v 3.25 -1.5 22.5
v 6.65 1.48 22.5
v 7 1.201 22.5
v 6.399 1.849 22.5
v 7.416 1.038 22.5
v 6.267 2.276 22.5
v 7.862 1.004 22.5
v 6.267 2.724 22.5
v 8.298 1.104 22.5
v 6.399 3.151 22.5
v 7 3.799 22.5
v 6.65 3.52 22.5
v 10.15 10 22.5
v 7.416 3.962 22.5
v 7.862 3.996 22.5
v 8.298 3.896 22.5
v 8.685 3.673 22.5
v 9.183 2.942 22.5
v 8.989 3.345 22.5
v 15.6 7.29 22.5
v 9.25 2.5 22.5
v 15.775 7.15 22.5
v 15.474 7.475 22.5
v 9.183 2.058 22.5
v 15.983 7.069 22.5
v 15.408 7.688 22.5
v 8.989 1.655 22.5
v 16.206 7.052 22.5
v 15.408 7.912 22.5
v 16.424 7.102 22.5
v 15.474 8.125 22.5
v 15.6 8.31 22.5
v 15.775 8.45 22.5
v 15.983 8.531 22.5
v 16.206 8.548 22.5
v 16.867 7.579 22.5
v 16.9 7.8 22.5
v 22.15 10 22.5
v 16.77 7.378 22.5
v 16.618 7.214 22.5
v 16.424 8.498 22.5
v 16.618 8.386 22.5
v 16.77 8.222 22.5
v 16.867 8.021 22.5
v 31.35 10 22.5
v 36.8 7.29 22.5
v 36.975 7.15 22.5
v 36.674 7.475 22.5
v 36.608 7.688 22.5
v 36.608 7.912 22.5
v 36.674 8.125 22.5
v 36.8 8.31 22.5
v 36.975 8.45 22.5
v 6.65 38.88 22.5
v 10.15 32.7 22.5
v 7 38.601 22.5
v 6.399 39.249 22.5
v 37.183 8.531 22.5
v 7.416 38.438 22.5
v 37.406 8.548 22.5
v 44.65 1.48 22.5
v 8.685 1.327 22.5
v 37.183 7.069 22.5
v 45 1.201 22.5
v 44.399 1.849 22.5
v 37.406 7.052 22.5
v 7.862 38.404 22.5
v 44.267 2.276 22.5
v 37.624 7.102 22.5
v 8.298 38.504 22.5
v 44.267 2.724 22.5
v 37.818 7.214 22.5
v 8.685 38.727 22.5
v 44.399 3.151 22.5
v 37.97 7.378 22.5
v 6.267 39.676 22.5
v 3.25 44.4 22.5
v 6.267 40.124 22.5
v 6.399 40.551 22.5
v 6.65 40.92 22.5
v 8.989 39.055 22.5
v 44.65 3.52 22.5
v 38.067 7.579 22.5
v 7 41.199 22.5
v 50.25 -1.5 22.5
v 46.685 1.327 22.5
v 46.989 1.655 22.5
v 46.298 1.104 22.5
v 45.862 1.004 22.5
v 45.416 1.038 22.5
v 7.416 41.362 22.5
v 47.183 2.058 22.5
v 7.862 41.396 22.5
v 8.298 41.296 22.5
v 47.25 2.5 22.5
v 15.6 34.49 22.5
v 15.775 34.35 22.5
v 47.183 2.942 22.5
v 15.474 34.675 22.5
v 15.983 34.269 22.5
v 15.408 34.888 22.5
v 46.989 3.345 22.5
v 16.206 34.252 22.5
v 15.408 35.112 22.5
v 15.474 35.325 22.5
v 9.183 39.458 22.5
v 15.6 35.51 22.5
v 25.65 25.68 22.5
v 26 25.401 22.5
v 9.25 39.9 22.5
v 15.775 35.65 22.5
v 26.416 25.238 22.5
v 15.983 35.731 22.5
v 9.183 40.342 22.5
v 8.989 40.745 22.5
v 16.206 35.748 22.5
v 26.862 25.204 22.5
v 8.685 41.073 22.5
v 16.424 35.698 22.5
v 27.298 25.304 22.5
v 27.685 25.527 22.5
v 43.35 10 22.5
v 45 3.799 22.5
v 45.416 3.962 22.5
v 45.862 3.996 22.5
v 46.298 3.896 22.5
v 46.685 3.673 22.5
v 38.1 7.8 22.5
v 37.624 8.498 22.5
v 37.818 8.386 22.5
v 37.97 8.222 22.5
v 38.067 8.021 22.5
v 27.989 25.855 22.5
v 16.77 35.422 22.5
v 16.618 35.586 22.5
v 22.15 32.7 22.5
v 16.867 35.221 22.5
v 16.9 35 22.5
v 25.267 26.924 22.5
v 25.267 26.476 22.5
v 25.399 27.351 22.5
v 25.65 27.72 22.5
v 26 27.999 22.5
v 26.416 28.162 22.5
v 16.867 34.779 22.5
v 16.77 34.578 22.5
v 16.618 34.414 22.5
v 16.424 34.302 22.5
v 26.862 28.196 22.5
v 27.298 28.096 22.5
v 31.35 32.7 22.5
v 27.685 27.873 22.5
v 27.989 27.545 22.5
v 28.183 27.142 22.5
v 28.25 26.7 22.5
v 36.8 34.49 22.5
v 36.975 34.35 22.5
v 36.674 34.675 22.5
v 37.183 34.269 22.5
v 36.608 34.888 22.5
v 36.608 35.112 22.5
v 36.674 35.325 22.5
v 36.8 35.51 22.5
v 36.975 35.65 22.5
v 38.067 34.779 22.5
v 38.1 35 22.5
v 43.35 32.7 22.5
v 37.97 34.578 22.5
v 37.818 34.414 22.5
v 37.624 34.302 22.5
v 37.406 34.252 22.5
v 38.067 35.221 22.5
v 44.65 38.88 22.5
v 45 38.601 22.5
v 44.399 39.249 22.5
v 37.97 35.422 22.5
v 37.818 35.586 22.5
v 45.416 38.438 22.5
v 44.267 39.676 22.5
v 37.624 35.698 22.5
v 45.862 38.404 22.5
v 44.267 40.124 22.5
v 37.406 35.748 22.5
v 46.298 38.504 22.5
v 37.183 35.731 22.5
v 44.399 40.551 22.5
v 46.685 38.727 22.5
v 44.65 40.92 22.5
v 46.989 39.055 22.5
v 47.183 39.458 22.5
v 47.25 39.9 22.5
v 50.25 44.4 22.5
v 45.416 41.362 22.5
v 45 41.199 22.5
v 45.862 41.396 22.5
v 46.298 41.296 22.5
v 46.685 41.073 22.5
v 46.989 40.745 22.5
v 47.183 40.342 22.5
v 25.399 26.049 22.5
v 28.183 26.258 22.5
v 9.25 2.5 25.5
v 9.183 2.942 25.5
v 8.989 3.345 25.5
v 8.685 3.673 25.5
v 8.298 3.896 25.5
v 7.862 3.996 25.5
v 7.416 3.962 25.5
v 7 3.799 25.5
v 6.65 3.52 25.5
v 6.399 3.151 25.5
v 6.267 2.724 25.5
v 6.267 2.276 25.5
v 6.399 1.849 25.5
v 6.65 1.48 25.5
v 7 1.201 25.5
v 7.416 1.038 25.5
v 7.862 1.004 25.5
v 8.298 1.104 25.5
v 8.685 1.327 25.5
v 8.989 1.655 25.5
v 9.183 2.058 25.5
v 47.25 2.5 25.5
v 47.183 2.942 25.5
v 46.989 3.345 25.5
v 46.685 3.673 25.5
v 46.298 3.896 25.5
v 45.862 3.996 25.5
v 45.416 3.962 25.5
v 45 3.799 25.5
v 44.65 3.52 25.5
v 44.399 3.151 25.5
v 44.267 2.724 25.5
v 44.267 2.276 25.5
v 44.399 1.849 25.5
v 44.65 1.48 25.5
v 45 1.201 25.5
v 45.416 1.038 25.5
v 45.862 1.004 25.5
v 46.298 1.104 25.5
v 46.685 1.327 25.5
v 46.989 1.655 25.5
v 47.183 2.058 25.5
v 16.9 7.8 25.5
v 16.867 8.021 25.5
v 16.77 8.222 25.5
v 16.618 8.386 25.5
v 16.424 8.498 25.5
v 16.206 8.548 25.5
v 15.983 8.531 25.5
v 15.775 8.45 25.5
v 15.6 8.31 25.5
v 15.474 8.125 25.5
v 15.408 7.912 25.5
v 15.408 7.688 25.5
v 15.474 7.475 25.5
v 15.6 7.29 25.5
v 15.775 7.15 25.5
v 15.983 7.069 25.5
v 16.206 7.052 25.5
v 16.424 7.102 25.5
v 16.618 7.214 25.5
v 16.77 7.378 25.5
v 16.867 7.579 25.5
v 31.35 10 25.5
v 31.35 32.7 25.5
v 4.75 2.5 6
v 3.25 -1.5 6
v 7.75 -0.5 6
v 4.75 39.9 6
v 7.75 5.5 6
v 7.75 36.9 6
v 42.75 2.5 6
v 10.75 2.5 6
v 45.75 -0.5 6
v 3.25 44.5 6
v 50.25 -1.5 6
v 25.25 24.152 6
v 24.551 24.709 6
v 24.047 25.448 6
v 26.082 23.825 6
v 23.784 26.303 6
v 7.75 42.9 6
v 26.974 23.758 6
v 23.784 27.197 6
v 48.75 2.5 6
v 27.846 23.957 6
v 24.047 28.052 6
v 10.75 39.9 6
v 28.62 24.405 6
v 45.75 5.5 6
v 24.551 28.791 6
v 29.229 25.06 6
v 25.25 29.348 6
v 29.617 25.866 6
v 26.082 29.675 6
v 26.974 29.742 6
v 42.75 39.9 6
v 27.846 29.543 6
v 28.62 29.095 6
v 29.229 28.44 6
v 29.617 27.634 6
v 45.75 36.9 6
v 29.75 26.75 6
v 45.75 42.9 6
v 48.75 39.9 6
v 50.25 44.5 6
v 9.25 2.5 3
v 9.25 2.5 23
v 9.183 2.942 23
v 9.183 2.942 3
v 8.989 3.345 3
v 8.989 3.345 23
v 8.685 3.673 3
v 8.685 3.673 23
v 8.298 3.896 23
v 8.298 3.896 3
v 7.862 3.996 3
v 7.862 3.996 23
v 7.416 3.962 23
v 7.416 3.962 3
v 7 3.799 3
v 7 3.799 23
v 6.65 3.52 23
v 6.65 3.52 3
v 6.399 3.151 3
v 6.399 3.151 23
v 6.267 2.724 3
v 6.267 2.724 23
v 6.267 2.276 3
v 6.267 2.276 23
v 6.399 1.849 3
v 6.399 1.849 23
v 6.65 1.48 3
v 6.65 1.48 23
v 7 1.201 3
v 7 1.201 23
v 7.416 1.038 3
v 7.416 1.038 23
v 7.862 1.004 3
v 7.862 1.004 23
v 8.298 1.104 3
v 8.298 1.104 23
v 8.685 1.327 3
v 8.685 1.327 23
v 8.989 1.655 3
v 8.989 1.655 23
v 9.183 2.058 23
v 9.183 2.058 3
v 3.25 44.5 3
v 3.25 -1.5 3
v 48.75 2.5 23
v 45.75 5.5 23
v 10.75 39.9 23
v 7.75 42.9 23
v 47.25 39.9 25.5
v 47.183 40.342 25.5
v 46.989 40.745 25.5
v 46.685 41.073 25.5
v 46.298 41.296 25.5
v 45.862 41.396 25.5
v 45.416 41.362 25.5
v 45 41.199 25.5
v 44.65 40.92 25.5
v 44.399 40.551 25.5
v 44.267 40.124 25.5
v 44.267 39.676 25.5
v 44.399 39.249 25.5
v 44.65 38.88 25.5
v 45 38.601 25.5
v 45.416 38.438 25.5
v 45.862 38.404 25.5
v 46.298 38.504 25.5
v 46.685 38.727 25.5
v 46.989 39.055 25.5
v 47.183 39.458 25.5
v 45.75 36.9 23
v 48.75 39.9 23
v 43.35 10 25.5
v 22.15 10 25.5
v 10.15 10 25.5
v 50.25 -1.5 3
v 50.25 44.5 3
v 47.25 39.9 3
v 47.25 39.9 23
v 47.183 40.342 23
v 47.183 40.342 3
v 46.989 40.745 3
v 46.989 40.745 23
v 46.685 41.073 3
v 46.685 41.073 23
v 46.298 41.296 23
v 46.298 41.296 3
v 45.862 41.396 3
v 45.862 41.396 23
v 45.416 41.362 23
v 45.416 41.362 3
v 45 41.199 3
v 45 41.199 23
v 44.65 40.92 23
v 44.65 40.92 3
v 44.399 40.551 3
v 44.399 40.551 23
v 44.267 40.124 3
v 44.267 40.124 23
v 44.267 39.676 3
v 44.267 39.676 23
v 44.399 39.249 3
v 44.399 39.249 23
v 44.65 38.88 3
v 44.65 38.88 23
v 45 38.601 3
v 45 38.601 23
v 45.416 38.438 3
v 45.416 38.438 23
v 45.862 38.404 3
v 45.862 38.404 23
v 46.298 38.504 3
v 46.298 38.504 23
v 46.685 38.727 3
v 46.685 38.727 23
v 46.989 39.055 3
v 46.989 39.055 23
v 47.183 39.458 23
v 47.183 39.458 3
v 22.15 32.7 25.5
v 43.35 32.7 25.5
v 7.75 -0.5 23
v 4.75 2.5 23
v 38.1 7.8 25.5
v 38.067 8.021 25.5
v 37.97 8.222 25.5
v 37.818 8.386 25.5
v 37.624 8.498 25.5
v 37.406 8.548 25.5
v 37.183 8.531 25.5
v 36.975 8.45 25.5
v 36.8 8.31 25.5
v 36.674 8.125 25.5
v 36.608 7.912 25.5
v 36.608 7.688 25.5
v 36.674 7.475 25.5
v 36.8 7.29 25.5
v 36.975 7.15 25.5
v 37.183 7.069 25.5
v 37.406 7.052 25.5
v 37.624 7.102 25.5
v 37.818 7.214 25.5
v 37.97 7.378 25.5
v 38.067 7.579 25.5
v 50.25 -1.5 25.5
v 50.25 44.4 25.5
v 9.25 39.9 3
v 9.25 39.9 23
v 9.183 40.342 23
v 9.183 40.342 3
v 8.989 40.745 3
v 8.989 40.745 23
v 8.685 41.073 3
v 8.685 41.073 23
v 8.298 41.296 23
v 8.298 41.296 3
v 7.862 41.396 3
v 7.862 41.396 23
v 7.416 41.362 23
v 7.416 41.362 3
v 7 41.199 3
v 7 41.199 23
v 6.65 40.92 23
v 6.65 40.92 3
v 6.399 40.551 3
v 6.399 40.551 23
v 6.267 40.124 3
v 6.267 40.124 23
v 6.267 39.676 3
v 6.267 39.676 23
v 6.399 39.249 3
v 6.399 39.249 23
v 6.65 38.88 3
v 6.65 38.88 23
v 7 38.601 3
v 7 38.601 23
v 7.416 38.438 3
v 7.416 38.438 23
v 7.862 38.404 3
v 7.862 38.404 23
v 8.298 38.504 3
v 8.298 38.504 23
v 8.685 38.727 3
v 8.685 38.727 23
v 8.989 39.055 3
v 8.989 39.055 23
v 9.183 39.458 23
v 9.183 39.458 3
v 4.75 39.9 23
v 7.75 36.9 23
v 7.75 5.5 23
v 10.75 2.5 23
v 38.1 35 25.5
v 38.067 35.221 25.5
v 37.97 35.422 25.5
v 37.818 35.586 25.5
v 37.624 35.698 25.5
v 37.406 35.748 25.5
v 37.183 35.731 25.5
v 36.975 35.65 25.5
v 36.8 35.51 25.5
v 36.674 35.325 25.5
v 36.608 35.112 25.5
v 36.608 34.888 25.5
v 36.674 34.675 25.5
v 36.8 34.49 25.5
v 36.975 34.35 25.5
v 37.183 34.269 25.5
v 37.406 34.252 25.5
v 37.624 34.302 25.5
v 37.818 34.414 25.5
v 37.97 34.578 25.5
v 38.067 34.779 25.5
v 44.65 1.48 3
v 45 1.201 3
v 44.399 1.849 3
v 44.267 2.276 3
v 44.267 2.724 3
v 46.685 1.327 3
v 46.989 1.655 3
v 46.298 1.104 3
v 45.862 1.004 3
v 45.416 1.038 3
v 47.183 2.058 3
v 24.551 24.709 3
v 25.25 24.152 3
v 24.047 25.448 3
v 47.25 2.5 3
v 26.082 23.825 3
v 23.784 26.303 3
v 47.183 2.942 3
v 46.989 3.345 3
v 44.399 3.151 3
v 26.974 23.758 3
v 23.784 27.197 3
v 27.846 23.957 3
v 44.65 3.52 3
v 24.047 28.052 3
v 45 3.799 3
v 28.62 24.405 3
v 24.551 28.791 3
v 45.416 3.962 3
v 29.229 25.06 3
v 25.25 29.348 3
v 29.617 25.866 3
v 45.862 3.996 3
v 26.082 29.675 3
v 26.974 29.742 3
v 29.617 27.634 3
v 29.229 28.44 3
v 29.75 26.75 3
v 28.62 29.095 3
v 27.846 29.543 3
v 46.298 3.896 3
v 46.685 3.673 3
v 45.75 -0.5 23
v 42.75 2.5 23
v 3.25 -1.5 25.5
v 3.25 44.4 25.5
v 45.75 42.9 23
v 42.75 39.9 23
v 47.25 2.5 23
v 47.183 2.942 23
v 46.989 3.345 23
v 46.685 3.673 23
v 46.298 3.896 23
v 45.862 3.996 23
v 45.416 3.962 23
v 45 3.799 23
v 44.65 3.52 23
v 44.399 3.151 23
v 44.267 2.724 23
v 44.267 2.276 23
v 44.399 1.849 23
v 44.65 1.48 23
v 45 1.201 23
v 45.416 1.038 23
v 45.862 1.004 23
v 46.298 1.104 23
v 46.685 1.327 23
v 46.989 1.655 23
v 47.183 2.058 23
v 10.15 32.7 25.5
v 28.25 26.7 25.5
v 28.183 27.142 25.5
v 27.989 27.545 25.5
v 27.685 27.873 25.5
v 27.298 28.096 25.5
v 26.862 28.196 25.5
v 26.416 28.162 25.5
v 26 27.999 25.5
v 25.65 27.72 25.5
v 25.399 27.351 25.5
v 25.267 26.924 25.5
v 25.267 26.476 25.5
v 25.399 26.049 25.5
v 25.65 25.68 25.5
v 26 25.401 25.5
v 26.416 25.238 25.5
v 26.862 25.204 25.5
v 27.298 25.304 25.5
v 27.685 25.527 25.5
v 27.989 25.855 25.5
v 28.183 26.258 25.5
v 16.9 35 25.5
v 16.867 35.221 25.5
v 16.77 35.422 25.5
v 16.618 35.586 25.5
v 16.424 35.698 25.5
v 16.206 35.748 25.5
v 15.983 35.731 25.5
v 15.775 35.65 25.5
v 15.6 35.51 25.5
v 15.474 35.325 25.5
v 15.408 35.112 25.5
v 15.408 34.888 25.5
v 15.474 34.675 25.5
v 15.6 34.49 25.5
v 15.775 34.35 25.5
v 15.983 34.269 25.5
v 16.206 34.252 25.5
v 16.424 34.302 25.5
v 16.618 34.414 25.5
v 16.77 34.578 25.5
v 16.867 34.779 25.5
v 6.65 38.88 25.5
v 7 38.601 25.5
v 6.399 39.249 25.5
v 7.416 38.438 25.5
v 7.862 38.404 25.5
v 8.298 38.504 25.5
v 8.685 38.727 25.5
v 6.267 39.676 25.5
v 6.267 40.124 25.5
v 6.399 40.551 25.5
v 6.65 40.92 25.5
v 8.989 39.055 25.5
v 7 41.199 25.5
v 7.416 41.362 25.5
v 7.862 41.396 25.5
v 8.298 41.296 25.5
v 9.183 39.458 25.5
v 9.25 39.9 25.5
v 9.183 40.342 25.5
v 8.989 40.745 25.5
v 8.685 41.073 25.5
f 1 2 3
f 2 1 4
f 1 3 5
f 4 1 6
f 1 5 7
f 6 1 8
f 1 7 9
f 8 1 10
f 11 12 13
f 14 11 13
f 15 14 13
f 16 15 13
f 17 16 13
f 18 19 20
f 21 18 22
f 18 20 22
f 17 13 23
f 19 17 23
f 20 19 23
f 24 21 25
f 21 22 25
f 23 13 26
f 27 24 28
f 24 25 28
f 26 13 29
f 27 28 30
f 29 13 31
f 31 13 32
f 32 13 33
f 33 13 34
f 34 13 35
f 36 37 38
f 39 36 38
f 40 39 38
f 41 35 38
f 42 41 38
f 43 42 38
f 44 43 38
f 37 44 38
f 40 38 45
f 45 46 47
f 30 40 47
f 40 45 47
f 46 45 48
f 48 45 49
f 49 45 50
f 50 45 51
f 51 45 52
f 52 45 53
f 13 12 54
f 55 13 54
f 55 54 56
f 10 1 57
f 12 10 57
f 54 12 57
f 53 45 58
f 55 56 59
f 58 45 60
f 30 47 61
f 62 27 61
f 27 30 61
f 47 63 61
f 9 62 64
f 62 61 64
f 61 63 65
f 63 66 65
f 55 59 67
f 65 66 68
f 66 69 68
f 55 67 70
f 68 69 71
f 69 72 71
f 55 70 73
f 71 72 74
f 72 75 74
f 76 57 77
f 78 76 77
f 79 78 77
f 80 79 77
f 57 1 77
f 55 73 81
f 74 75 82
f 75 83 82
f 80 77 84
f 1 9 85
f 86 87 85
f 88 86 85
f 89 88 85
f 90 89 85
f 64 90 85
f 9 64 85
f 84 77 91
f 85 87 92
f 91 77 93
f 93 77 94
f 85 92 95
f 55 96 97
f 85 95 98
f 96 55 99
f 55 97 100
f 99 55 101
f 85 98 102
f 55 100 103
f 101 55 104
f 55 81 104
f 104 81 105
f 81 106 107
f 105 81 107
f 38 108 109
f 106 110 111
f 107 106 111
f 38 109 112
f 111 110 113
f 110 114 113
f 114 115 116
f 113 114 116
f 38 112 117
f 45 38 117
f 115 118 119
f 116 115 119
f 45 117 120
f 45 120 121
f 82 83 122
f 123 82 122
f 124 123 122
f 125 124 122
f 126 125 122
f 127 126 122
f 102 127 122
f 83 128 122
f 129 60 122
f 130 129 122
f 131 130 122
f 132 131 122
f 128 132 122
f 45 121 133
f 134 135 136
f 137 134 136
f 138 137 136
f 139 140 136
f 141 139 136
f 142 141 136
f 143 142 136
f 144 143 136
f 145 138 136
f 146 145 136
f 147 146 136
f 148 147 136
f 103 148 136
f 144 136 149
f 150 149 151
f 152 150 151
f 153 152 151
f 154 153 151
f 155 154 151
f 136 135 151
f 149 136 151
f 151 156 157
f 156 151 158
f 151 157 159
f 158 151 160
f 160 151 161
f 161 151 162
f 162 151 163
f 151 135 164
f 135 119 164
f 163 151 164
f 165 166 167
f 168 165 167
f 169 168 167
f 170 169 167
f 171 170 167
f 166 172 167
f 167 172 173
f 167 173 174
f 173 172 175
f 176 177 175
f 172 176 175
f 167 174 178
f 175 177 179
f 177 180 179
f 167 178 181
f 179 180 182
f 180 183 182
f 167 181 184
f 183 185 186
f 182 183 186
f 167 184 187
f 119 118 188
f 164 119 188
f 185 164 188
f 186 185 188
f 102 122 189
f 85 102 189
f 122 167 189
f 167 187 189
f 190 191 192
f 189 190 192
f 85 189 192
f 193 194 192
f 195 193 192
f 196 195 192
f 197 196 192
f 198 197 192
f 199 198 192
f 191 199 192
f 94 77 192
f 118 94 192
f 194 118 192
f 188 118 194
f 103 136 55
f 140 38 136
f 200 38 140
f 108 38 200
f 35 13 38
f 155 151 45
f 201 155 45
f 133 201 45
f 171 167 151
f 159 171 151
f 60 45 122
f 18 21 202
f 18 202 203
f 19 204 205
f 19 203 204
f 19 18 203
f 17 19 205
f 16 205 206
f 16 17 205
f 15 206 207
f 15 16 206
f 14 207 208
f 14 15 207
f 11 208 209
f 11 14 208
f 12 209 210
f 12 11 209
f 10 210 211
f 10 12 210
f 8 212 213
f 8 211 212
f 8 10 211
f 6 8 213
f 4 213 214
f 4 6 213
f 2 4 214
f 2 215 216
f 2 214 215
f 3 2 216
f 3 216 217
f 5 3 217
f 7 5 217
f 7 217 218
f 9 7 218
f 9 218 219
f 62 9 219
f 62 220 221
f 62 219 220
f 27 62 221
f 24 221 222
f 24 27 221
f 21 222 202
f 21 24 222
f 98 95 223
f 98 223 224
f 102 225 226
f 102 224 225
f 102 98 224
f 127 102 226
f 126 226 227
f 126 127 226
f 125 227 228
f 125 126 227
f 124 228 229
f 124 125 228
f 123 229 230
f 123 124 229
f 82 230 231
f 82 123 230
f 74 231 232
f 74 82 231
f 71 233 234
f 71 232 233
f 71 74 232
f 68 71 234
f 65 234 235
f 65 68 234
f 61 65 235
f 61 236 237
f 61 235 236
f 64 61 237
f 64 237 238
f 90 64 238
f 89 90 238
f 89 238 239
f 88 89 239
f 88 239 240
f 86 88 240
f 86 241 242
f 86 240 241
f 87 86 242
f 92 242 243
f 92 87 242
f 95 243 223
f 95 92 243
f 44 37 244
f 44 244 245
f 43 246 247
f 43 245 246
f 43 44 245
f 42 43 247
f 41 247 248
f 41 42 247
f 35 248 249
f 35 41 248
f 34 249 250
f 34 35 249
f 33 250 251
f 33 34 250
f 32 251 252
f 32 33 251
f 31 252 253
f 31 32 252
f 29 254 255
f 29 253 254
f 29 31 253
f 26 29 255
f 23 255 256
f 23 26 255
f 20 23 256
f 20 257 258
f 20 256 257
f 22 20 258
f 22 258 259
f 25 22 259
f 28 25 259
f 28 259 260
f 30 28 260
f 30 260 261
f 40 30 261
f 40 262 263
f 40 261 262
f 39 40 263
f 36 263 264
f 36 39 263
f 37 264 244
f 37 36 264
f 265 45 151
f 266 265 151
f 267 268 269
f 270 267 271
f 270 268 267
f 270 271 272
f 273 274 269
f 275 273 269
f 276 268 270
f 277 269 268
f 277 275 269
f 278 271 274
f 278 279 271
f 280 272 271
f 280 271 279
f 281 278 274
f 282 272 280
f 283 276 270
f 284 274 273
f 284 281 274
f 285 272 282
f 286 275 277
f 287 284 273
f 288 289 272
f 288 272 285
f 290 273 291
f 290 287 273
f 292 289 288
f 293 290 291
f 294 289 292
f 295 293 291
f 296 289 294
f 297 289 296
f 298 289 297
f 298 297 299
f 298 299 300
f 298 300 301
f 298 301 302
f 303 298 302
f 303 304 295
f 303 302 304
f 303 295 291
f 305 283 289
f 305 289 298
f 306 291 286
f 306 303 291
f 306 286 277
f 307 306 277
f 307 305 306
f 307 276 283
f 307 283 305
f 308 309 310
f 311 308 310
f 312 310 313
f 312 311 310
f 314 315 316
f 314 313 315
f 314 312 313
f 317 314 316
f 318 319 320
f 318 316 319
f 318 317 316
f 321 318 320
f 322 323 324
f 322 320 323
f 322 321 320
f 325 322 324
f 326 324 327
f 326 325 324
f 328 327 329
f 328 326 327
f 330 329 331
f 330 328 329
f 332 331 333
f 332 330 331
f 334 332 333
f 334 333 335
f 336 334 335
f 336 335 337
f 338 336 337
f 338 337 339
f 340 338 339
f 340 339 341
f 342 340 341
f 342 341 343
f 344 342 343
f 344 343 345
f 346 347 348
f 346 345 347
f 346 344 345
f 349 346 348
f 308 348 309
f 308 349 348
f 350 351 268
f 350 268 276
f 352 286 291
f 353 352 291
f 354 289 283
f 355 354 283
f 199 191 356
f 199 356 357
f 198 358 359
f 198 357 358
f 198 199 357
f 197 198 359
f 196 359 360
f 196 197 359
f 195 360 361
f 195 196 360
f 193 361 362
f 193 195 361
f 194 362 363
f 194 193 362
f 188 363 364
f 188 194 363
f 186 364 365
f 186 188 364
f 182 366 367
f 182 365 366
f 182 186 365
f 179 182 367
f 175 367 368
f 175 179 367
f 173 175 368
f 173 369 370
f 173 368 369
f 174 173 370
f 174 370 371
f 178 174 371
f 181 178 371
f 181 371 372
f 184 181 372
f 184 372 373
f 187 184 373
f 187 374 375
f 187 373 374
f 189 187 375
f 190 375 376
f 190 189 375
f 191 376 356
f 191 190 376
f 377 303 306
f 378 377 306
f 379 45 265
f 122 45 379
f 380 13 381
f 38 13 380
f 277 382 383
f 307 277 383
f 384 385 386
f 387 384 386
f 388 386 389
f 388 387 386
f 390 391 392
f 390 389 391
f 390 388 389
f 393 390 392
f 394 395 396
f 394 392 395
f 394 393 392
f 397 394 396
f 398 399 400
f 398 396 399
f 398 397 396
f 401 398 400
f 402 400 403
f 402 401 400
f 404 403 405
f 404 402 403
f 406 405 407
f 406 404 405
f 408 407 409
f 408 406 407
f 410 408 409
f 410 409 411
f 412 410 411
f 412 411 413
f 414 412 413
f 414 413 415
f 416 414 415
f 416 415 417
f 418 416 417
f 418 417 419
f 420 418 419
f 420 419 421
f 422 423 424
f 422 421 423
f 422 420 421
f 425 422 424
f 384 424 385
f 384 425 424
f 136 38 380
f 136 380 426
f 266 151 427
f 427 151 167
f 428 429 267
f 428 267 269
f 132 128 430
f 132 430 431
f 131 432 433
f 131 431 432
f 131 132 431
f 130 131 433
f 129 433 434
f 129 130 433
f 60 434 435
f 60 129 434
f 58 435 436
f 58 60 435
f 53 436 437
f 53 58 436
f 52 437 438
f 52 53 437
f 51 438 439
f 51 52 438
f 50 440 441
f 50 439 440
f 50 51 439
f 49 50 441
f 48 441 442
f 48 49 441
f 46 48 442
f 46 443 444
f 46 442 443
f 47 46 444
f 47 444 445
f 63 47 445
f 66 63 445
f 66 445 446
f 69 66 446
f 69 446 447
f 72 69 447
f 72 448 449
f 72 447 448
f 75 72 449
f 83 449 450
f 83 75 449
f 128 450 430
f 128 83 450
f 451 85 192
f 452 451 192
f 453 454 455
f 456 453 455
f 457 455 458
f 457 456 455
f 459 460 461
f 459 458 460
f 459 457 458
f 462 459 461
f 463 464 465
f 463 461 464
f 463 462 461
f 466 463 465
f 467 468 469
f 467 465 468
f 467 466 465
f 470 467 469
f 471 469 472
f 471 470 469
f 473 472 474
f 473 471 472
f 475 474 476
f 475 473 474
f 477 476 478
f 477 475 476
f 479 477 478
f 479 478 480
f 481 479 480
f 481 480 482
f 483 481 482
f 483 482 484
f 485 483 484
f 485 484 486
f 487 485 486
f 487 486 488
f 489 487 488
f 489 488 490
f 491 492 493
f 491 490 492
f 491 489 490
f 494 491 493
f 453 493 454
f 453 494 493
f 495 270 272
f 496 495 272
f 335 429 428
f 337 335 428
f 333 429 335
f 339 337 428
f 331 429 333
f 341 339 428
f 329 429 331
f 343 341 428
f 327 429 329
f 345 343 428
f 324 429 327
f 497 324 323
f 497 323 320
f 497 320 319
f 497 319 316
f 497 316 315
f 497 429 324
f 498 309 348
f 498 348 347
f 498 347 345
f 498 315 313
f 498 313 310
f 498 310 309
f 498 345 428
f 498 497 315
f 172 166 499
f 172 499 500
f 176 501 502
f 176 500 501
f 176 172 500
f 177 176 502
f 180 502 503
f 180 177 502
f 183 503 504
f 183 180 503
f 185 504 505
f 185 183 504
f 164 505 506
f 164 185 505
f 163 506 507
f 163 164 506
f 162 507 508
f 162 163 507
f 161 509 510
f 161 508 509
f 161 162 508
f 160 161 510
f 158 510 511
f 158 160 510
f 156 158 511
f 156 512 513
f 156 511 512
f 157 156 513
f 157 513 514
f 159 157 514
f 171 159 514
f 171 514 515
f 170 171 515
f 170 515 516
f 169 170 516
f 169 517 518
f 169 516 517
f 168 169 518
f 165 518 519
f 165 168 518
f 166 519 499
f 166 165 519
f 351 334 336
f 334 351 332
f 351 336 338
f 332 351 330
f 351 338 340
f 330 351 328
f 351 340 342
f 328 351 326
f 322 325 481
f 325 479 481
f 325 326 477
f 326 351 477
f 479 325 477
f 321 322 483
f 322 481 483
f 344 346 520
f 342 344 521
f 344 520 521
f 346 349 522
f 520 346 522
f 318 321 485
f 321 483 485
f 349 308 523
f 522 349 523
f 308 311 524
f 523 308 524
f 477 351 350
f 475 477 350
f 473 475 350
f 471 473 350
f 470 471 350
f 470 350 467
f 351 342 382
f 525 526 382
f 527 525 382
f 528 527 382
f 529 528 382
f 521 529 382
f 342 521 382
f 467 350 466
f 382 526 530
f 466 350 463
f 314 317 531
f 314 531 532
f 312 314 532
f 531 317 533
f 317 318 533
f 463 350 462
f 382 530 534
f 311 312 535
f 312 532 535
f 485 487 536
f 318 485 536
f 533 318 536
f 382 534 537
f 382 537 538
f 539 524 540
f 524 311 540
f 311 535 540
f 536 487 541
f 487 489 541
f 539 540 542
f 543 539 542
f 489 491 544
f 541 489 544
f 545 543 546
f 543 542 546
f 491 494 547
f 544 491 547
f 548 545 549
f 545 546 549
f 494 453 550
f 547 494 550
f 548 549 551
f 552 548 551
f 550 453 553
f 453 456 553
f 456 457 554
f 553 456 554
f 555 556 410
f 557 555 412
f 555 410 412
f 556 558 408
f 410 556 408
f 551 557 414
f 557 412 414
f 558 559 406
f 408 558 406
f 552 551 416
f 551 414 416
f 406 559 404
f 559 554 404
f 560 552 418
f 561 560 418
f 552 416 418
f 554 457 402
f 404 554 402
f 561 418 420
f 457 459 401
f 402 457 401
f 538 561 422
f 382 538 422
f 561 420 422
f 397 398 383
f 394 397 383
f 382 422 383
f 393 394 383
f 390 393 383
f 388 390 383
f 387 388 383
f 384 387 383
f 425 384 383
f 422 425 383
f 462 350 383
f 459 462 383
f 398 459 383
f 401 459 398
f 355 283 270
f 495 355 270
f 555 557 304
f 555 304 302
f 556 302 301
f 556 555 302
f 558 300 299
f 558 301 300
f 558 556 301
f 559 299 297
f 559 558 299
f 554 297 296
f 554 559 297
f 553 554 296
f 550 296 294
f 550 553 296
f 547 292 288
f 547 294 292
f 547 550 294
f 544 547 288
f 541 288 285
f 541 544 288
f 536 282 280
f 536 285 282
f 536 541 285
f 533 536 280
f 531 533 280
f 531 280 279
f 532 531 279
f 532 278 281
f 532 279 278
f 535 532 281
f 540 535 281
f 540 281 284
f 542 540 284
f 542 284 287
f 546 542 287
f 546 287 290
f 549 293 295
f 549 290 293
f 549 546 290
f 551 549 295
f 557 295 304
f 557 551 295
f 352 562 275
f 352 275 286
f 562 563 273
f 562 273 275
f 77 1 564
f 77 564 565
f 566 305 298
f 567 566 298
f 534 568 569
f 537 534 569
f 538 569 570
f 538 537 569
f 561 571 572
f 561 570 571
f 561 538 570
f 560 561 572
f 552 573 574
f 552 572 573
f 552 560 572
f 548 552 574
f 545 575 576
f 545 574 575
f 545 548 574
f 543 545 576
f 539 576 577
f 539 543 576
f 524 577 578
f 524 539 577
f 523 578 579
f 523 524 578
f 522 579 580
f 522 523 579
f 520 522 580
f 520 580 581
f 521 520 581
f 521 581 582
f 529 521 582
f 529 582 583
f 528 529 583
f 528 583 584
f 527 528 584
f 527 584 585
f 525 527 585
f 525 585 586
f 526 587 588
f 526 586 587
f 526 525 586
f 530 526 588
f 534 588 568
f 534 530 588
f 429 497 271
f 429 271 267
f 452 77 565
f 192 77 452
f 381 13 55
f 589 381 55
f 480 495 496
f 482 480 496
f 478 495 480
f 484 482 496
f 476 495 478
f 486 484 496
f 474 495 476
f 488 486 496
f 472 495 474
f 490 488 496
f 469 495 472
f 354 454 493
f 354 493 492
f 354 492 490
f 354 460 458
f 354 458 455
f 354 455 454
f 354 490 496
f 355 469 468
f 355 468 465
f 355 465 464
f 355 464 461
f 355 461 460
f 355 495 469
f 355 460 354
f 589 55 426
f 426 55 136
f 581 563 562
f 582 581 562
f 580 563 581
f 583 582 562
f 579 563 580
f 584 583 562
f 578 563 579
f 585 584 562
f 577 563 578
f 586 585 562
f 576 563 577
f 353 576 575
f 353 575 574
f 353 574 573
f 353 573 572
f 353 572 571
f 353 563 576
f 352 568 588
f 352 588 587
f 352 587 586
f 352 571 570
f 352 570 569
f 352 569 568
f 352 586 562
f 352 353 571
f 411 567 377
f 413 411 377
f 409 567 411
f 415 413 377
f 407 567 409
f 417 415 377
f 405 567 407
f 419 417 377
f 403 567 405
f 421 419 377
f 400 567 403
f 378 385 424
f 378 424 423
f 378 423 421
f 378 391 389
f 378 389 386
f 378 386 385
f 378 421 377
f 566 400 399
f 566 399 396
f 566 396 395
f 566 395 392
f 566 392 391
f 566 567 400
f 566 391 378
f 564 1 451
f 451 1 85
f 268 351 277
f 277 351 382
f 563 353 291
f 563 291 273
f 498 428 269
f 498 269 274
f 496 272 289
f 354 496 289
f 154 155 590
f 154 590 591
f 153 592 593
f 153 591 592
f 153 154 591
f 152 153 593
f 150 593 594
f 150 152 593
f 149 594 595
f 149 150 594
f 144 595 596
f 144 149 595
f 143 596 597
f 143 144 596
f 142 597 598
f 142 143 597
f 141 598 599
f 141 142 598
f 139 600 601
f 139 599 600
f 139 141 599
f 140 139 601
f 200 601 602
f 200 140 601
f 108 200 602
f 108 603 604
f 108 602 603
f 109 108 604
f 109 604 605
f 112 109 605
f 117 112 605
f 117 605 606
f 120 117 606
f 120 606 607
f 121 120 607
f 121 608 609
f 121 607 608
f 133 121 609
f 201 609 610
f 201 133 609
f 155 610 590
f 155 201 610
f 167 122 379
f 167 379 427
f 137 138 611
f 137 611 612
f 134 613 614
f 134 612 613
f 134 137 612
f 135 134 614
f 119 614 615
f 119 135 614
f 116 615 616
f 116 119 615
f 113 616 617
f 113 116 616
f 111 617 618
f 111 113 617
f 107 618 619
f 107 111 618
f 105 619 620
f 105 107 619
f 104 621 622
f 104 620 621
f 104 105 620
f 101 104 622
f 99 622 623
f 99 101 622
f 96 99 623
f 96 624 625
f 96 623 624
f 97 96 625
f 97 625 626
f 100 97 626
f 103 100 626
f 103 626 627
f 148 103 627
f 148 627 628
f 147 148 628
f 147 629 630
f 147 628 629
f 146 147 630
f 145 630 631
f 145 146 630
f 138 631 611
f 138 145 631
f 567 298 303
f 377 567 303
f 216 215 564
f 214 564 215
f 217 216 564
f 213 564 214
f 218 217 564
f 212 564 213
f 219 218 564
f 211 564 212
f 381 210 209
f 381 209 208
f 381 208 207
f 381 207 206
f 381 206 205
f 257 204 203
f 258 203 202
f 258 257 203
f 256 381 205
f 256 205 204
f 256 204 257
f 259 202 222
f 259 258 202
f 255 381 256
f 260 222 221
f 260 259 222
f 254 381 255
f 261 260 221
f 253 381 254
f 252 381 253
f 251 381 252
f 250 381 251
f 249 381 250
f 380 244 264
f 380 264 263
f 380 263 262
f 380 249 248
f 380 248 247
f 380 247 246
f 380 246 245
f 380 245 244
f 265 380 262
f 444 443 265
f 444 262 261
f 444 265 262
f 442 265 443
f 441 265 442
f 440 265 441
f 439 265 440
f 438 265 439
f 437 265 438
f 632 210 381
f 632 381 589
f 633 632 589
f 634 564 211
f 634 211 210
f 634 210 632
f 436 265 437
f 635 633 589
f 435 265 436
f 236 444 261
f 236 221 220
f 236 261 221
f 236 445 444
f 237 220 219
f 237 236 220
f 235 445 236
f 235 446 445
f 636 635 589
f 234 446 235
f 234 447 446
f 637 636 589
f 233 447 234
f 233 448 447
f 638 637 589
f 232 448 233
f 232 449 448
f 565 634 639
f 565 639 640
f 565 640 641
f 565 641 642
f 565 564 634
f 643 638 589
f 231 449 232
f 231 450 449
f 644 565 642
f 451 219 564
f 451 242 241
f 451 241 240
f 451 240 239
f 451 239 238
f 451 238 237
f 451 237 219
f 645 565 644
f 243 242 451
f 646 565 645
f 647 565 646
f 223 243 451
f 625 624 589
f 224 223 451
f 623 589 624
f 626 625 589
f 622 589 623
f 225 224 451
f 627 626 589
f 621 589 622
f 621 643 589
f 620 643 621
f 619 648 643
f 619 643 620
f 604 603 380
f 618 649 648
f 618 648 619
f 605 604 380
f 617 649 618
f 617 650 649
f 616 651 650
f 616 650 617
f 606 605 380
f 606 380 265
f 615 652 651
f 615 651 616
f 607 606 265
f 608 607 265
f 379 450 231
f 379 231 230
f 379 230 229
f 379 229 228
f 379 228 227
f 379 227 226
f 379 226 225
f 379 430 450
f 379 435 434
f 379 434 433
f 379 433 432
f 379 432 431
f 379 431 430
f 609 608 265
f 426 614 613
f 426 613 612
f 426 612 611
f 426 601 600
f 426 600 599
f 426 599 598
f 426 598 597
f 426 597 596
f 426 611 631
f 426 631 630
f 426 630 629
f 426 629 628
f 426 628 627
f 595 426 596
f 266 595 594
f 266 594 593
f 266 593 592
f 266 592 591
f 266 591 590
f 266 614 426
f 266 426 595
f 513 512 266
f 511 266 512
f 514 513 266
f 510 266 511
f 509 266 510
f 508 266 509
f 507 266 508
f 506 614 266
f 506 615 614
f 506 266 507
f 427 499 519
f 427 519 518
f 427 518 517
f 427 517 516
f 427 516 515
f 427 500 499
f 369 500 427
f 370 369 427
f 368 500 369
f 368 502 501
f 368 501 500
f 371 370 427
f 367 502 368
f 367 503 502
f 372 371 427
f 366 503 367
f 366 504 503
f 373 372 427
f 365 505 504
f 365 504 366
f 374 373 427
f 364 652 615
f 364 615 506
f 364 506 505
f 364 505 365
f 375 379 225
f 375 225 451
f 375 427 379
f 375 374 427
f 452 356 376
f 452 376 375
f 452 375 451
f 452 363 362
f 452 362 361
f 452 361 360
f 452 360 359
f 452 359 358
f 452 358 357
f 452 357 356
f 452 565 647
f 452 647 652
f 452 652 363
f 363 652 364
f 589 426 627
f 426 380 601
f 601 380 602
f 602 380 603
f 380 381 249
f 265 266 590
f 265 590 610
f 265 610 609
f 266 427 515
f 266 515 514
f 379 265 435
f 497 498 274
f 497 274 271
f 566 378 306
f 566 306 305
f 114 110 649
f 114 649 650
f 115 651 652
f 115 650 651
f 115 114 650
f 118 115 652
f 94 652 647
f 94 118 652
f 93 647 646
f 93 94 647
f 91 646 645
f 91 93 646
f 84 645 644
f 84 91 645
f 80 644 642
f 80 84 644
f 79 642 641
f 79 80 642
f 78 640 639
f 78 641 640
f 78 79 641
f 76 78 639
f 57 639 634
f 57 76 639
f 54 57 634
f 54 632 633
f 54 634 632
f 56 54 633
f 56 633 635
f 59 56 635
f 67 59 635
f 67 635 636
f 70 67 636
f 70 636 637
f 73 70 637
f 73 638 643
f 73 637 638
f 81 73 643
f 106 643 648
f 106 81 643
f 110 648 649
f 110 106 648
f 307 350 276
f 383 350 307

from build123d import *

# Parameters (mm, degrees)
CYLINDER003_R     = 1.5
CYLINDER003_DEPTH = 27
ARRAY002_X_COUNT  = 2
ARRAY002_X_PITCH  = 38
ARRAY002_Y_COUNT  = 2
ARRAY002_Y_PITCH  = 37.4
CYLINDER002_R     = 3
CYLINDER002_DEPTH = 10
PRISM_DEPTH       = 20
ARRAY003_X_COUNT  = 2
ARRAY003_X_PITCH  = 38
ARRAY003_Y_COUNT  = 2
ARRAY003_Y_PITCH  = 37.4
BOX001_W          = 47
BOX001_H          = 46
BOX001_DEPTH      = 3
CYLINDER006_R     = 0.75
CYLINDER006_DEPTH = 10
ARRAY006_X_COUNT  = 2
ARRAY006_X_PITCH  = 21.2
ARRAY006_Y_COUNT  = 2
ARRAY006_Y_PITCH  = 27.2
BOX003_W          = 12
BOX003_H          = 22.7
BOX003_DEPTH      = 10
ARRAY004_X_COUNT  = 2
ARRAY004_X_PITCH  = 21.2
CYLINDER004_R     = 1.5
CYLINDER004_DEPTH = 10
ARRAY005_X_COUNT  = 2
ARRAY005_X_PITCH  = 38
ARRAY005_Y_COUNT  = 2
ARRAY005_Y_PITCH  = 37.4
CYLINDER005_R     = 1.5
CYLINDER005_DEPTH = 10
BOX002_W          = 47
BOX002_H          = 45.9
BOX002_DEPTH      = 3


with BuildPart() as array002:
    # Cylinder003 → Cylinder003 (new body)
    with BuildSketch(Plane(origin=(7.75, 2.5, 0), x_dir=(1, 0, 0), z_dir=(0, 0, 1))):
        Circle(CYLINDER003_R)
    extrude(amount=CYLINDER003_DEPTH)

    # Array002 X: Array002 ×2


with BuildPart() as array002_1:
    add(array002.part)
    with Locations(*[(i * ARRAY002_X_PITCH, 0, 0) for i in range(1, ARRAY002_X_COUNT)]):
        add(array002.part)

    # Array002 Y: Array002 ×2


with BuildPart() as array002_2:
    add(array002_1.part)
    with Locations(*[(0, i * ARRAY002_Y_PITCH, 0) for i in range(1, ARRAY002_Y_COUNT)]):
        add(array002_1.part)


with BuildPart() as fusion002:
    # Cylinder002 → Cylinder002 (new body)
    with BuildSketch(Plane(origin=(26.75, 26.75, 0), x_dir=(1, 0, 0), z_dir=(0, 0, 1))):
        Circle(CYLINDER002_R)
    extrude(amount=CYLINDER002_DEPTH)

    # Fusion002: union Array002
    add(array002_2.part)


with BuildPart() as array_columnas:
    # Prism → Prism (new body)
    with BuildSketch(Plane(origin=(7.75, 2.5, 3), x_dir=(1, 0, 0), z_dir=(0, 0, 1))):
        Polygon((3, 0), (0, 3), (-3, 0), (0, -3), align=None)
    extrude(amount=PRISM_DEPTH)

    # Array003 X: Array columnas ×2


with BuildPart() as array_columnas_1:
    add(array_columnas.part)
    with Locations(*[(i * ARRAY003_X_PITCH, 0, 0) for i in range(1, ARRAY003_X_COUNT)]):
        add(array_columnas.part)

    # Array003 Y: Array columnas ×2


with BuildPart() as array_columnas_2:
    add(array_columnas_1.part)
    with Locations(*[(0, i * ARRAY003_Y_PITCH, 0) for i in range(1, ARRAY003_Y_COUNT)]):
        add(array_columnas_1.part)


with BuildPart() as top_plate_final:
    # Box001 → Box001 (new body)
    with BuildSketch(Plane(origin=(3.25, -1.5, 3), x_dir=(1, 0, 0), z_dir=(0, 0, 1))):
        with Locations((23.5, 23)):
            Rectangle(BOX001_W, BOX001_H)
    extrude(amount=BOX001_DEPTH)

    # Fusion001: union Array columnas
    add(array_columnas_2.part)

    # Cut001: cut Fusion002
    add(fusion002.part, mode=Mode.SUBTRACT)


with BuildPart() as array006:
    # Cylinder006 → Cylinder006 (new body)
    with BuildSketch(Plane(origin=(16.15, 7.8, 19.5), x_dir=(1, 0, 0), z_dir=(0, 0, 1))):
        Circle(CYLINDER006_R)
    extrude(amount=CYLINDER006_DEPTH)

    # Array006 X: Array006 ×2


with BuildPart() as array006_1:
    add(array006.part)
    with Locations(*[(i * ARRAY006_X_PITCH, 0, 0) for i in range(1, ARRAY006_X_COUNT)]):
        add(array006.part)

    # Array006 Y: Array006 ×2


with BuildPart() as array006_2:
    add(array006_1.part)
    with Locations(*[(0, i * ARRAY006_Y_PITCH, 0) for i in range(1, ARRAY006_Y_COUNT)]):
        add(array006_1.part)


with BuildPart() as array_taladro_servomotor:
    # Box003 → Box003 (new body)
    with BuildSketch(Plane(origin=(10.15, 10, 19.5), x_dir=(1, 0, 0), z_dir=(0, 0, 1))):
        with Locations((6, 11.35)):
            Rectangle(BOX003_W, BOX003_H)
    extrude(amount=BOX003_DEPTH)

    # Array004 X: Array taladro servomotor ×2


with BuildPart() as array_taladro_servomotor_1:
    add(array_taladro_servomotor.part)
    with Locations(*[(i * ARRAY004_X_PITCH, 0, 0) for i in range(1, ARRAY004_X_COUNT)]):
        add(array_taladro_servomotor.part)


with BuildPart() as array005:
    # Cylinder004 → Cylinder004 (new body)
    with BuildSketch(Plane(origin=(7.75, 2.5, 19.5), x_dir=(1, 0, 0), z_dir=(0, 0, 1))):
        Circle(CYLINDER004_R)
    extrude(amount=CYLINDER004_DEPTH)

    # Array005 X: Array005 ×2


with BuildPart() as array005_1:
    add(array005.part)
    with Locations(*[(i * ARRAY005_X_PITCH, 0, 0) for i in range(1, ARRAY005_X_COUNT)]):
        add(array005.part)

    # Array005 Y: Array005 ×2


with BuildPart() as array005_2:
    add(array005_1.part)
    with Locations(*[(0, i * ARRAY005_Y_PITCH, 0) for i in range(1, ARRAY005_Y_COUNT)]):
        add(array005_1.part)


with BuildPart() as fusion003:
    # Cylinder005 → Cylinder005 (new body)
    with BuildSketch(Plane(origin=(26.75, 26.7, 19.5), x_dir=(1, 0, 0), z_dir=(0, 0, 1))):
        Circle(CYLINDER005_R)
    extrude(amount=CYLINDER005_DEPTH)

    # Fusion003: union Array006, Array taladro servomotor, Array005
    add(array006_2.part)
    add(array_taladro_servomotor_1.part)
    add(array005_2.part)


with BuildPart() as base_final:
    # Box002 → Box002 (new body)
    with BuildSketch(Plane(origin=(3.25, -1.5, 22.5), x_dir=(1, 0, 0), z_dir=(0, 0, 1))):
        with Locations((23.5, 22.95)):
            Rectangle(BOX002_W, BOX002_H)
    extrude(amount=BOX002_DEPTH)

    # Cut002: cut Fusion003
    add(fusion003.part, mode=Mode.SUBTRACT)


solid = Compound([top_plate_final.part, base_final.part])
